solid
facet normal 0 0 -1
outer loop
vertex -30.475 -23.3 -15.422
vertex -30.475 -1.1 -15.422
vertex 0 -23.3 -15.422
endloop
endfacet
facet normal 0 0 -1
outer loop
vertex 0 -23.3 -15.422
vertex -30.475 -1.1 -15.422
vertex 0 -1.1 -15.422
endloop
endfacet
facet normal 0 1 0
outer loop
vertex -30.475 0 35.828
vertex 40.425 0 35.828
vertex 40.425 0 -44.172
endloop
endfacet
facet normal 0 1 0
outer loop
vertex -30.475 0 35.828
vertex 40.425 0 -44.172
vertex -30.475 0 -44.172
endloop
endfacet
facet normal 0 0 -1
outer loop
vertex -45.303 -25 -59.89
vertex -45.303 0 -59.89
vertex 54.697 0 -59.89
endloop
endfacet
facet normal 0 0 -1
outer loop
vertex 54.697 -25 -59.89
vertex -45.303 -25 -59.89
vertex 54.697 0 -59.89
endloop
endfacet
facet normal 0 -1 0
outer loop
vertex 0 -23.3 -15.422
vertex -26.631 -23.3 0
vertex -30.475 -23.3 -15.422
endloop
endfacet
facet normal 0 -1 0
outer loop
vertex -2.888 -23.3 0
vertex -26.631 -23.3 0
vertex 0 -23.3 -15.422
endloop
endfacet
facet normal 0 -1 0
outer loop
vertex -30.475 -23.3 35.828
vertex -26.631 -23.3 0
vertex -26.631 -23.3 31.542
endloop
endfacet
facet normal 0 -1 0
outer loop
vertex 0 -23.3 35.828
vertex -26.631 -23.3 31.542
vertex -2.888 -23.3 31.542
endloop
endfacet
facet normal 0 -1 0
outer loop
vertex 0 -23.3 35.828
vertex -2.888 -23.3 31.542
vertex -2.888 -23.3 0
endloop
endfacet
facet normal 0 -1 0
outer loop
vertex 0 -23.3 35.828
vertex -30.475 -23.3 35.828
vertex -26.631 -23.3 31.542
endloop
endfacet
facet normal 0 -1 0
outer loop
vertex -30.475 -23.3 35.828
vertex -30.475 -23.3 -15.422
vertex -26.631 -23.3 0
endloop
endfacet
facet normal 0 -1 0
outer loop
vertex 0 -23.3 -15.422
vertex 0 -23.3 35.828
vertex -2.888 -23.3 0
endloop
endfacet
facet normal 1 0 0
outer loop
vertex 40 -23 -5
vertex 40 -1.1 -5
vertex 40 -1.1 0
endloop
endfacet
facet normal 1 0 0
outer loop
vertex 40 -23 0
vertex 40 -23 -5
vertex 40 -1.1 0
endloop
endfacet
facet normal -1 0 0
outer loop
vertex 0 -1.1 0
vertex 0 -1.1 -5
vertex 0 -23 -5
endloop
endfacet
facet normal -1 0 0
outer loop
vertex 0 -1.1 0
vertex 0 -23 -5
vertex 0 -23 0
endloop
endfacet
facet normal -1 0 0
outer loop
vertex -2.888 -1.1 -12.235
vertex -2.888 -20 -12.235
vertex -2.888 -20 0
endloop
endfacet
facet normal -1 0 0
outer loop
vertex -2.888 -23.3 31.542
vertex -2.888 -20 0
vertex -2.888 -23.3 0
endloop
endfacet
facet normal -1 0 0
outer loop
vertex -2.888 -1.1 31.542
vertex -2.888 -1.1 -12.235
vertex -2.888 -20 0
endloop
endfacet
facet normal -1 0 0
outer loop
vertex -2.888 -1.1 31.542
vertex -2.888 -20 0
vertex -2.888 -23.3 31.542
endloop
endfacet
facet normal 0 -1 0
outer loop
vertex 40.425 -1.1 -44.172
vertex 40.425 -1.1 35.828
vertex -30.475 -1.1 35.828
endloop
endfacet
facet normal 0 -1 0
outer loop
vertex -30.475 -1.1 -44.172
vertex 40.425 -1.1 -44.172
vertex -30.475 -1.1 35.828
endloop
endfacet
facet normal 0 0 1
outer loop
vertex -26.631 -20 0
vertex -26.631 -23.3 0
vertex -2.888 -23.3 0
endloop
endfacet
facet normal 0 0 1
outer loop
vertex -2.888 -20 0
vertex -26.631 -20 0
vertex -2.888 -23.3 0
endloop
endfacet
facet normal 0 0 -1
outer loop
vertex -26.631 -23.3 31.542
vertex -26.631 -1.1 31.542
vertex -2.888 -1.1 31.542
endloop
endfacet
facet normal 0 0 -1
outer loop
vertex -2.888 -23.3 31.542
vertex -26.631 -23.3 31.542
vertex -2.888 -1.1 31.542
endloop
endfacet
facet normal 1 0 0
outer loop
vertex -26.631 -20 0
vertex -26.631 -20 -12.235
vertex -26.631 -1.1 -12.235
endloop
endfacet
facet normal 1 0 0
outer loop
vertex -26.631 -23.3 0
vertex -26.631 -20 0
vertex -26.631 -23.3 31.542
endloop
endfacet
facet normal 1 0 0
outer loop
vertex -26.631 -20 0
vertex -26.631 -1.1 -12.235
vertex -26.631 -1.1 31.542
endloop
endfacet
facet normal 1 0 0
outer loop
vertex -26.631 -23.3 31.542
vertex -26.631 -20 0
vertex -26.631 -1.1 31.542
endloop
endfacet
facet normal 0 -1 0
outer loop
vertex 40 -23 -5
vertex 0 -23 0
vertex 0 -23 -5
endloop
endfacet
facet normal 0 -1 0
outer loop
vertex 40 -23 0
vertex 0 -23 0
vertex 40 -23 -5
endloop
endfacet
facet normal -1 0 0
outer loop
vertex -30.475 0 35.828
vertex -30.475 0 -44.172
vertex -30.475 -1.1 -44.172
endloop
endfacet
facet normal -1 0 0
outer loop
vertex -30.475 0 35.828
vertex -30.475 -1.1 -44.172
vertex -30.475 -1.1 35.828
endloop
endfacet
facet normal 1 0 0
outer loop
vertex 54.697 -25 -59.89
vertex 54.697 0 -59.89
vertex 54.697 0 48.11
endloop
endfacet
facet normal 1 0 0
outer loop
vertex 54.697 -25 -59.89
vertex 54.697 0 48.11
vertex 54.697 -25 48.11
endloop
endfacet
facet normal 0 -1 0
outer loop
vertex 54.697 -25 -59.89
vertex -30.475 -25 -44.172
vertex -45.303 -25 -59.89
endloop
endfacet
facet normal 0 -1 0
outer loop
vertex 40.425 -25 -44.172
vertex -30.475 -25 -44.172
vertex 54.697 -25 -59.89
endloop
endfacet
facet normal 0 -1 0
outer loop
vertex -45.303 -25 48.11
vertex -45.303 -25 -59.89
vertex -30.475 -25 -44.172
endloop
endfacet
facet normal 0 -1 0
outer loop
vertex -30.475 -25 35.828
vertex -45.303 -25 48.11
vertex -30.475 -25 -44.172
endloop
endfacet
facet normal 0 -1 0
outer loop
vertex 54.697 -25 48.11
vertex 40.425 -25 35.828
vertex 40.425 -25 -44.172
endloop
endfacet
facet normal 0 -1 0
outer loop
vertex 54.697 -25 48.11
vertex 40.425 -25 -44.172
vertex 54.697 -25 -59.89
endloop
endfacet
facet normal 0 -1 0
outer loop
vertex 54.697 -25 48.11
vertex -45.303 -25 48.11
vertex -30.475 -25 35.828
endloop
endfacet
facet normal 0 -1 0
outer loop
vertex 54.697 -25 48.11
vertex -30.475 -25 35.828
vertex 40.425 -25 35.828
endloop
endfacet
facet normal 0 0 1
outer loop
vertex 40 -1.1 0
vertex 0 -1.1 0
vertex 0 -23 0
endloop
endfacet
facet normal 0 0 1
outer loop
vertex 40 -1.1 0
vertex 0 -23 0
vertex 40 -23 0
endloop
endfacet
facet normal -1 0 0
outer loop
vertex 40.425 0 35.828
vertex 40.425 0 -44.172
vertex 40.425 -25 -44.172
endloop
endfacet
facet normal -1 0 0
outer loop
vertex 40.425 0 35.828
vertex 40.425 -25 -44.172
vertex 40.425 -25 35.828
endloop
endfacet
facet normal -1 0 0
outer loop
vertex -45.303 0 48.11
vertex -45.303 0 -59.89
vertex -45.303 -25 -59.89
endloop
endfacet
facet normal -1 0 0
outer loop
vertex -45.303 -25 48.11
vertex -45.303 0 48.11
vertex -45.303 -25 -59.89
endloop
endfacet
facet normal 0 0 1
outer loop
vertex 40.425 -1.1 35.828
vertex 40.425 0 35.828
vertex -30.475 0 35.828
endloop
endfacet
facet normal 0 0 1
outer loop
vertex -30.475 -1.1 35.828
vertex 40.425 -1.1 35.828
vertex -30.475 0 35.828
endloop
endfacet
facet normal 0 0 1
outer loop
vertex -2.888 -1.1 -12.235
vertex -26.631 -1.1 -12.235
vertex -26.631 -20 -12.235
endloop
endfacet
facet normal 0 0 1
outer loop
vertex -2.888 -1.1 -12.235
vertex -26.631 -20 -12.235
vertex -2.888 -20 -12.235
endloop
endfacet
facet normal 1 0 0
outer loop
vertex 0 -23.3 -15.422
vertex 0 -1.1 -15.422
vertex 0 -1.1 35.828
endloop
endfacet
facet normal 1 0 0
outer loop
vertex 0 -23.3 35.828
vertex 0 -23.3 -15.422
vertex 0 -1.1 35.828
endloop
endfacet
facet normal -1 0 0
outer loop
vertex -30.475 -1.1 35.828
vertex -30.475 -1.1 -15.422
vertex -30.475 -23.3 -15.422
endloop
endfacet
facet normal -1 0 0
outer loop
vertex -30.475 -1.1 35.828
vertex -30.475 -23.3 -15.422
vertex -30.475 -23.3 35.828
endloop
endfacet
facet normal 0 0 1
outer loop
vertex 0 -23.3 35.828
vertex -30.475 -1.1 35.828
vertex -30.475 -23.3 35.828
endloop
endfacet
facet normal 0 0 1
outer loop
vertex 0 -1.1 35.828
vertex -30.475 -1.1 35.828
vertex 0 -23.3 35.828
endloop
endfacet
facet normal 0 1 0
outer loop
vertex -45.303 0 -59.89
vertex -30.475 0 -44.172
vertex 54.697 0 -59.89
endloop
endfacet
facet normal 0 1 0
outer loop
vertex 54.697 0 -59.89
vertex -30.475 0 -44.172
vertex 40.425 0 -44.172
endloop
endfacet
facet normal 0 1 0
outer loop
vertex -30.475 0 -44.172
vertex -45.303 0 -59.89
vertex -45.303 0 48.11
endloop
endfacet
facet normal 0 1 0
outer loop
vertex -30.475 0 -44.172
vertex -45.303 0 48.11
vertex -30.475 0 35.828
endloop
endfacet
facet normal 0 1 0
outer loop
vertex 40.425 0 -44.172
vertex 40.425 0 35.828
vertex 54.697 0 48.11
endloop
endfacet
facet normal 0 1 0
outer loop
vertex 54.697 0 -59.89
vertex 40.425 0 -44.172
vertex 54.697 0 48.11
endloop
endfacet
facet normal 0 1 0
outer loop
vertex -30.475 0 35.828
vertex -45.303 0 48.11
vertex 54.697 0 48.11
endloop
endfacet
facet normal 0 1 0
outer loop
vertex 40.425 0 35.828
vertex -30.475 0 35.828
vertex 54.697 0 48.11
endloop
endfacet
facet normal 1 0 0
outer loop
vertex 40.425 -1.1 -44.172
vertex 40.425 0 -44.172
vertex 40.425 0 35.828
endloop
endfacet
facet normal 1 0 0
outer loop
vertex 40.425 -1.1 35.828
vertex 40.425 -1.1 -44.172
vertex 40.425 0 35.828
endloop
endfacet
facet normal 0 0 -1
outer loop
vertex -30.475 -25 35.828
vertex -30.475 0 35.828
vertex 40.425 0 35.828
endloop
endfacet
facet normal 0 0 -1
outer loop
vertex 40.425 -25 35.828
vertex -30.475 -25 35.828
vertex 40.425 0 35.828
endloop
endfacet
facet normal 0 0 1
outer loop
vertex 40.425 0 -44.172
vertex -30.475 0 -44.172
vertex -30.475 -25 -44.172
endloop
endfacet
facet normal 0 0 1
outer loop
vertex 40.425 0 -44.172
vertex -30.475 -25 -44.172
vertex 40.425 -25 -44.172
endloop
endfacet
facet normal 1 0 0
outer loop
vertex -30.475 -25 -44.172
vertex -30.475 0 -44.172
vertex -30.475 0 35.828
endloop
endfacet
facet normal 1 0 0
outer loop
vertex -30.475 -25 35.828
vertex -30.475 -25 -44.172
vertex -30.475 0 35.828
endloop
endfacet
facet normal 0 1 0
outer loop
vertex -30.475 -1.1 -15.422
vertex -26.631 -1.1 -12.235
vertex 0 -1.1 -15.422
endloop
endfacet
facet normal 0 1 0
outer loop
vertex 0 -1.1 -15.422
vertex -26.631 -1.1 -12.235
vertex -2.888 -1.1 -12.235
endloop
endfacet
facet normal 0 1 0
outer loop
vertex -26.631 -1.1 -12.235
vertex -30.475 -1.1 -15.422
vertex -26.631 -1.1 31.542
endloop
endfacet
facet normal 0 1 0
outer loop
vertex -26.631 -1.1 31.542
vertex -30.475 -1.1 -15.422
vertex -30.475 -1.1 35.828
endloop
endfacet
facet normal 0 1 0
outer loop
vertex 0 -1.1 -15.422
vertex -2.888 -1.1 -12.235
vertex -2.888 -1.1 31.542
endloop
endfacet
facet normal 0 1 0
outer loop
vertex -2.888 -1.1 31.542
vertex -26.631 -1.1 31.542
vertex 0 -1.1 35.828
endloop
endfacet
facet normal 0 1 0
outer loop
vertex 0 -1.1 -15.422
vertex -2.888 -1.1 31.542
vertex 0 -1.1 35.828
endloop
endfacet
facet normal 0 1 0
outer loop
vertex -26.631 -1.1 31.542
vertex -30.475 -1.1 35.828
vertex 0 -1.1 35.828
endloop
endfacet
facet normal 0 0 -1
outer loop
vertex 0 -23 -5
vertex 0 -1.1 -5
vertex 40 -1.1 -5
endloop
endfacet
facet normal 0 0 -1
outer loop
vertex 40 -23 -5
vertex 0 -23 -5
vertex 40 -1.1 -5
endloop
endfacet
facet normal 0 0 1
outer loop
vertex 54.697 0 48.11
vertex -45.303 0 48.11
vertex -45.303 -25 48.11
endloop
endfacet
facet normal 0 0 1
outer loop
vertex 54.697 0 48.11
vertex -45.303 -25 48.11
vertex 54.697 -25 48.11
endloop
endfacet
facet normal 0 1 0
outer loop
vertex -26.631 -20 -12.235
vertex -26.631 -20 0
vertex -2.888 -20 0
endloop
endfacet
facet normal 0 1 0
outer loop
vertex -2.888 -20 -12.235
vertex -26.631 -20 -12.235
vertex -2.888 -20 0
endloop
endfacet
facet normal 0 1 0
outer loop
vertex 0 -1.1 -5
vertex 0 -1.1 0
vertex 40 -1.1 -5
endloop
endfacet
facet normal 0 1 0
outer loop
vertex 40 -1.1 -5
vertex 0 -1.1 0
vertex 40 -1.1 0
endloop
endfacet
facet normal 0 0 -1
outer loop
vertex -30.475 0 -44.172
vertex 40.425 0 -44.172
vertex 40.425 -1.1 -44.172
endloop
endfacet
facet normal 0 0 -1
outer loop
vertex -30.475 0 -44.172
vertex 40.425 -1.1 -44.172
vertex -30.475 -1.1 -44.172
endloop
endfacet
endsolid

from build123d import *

# Parameters (mm, degrees)
F0_W      = 100
F0_H      = 100
F0_W_2    = 80
F0_H_2    = 80
F1_DEPTH  = 25
F2_DEPTH  = 9.1
F3_DEPTH  = 8
F4_W      = 70.9
F4_H      = 80
F5_DEPTH  = 1.1
F7_W      = 30.4748764277
F7_H      = 51.2500227615
F7_W_2    = 23.7426077947
F7_H_2    = 43.7766229734
F8_DEPTH  = 22.2
F9_W      = 40
F9_H      = 5
F10_DEPTH = 21.9
F11_W     = 23.7426077947
F11_H     = 12.2345564887
F12_DEPTH = 3.3
F14_R     = 2.928713386
F15_DEPTH = 1.3


with BuildPart() as f1:
    # F0 (on Front) → F1 (new body)
    with BuildSketch(Plane.XZ):
        with Locations((4.6970173717, -1.8900542269)):
            Rectangle(F0_W, F0_H)
        with Locations((0.4251235723, -4.1719554365)):
            Rectangle(F0_W_2, F0_H_2, mode=Mode.SUBTRACT)
    extrude(amount=F1_DEPTH)

    # F2 (add): a face of the model
    f2_faces = [f1.faces().sort_by_distance(p)[0] for p in [
        (-39.5748764277, -12.5, -4.1719554365),
    ]]
    extrude(f2_faces, amount=F2_DEPTH)

    # F3 (add): a face of the model
    f3_faces = [f1.faces().sort_by_distance(p)[0] for p in [
        (4.6970173717, -12.5, -51.8900542269),
    ]]
    extrude(f3_faces, amount=F3_DEPTH)


with BuildPart() as f5:
    # F4 (on face) → F5 (new body)
    with BuildSketch(Plane(origin=(0, 0, 0), x_dir=(-1, 0, 0), z_dir=(0, 1, 0))):
        with Locations((-4.9751235723, -4.1719554365)):
            Rectangle(F4_W, F4_H)
    extrude(amount=-F5_DEPTH)


with BuildPart() as f8:
    # F7 (on face) → F8 (new body)
    with BuildSketch(Plane.XZ.offset(1.1)):
        with Locations((-15.2374382138, 10.2030331828)):
            Rectangle(F7_W, F7_H)
        with Locations((-14.7596453317, 9.653754998)):
            Rectangle(F7_W_2, F7_H_2, mode=Mode.SUBTRACT)
    extrude(amount=F8_DEPTH)

    # F11 (on face) → F12 (join)
    with BuildSketch(Plane.XZ.offset(23.3)):
        with Locations((-14.7596453317, -6.1172782443)):
            Rectangle(F11_W, F11_H)
    extrude(amount=-F12_DEPTH)

    # F14 (on face) → F15 (join)
    with BuildSketch(Plane.XZ.offset(23.3)):
        with Locations((-15.2722168714, -7.7124517411)):
            Circle(F14_R)
    extrude(amount=-F15_DEPTH)


with BuildPart() as f10:
    # F9 (on face) → F10 (new body)
    with BuildSketch(Plane.XZ.offset(1.1)):
        with Locations((20, -2.5)):
            Rectangle(F9_W, F9_H)
    extrude(amount=F10_DEPTH)


solid = Compound([f1.part, f5.part, f8.part, f10.part])
